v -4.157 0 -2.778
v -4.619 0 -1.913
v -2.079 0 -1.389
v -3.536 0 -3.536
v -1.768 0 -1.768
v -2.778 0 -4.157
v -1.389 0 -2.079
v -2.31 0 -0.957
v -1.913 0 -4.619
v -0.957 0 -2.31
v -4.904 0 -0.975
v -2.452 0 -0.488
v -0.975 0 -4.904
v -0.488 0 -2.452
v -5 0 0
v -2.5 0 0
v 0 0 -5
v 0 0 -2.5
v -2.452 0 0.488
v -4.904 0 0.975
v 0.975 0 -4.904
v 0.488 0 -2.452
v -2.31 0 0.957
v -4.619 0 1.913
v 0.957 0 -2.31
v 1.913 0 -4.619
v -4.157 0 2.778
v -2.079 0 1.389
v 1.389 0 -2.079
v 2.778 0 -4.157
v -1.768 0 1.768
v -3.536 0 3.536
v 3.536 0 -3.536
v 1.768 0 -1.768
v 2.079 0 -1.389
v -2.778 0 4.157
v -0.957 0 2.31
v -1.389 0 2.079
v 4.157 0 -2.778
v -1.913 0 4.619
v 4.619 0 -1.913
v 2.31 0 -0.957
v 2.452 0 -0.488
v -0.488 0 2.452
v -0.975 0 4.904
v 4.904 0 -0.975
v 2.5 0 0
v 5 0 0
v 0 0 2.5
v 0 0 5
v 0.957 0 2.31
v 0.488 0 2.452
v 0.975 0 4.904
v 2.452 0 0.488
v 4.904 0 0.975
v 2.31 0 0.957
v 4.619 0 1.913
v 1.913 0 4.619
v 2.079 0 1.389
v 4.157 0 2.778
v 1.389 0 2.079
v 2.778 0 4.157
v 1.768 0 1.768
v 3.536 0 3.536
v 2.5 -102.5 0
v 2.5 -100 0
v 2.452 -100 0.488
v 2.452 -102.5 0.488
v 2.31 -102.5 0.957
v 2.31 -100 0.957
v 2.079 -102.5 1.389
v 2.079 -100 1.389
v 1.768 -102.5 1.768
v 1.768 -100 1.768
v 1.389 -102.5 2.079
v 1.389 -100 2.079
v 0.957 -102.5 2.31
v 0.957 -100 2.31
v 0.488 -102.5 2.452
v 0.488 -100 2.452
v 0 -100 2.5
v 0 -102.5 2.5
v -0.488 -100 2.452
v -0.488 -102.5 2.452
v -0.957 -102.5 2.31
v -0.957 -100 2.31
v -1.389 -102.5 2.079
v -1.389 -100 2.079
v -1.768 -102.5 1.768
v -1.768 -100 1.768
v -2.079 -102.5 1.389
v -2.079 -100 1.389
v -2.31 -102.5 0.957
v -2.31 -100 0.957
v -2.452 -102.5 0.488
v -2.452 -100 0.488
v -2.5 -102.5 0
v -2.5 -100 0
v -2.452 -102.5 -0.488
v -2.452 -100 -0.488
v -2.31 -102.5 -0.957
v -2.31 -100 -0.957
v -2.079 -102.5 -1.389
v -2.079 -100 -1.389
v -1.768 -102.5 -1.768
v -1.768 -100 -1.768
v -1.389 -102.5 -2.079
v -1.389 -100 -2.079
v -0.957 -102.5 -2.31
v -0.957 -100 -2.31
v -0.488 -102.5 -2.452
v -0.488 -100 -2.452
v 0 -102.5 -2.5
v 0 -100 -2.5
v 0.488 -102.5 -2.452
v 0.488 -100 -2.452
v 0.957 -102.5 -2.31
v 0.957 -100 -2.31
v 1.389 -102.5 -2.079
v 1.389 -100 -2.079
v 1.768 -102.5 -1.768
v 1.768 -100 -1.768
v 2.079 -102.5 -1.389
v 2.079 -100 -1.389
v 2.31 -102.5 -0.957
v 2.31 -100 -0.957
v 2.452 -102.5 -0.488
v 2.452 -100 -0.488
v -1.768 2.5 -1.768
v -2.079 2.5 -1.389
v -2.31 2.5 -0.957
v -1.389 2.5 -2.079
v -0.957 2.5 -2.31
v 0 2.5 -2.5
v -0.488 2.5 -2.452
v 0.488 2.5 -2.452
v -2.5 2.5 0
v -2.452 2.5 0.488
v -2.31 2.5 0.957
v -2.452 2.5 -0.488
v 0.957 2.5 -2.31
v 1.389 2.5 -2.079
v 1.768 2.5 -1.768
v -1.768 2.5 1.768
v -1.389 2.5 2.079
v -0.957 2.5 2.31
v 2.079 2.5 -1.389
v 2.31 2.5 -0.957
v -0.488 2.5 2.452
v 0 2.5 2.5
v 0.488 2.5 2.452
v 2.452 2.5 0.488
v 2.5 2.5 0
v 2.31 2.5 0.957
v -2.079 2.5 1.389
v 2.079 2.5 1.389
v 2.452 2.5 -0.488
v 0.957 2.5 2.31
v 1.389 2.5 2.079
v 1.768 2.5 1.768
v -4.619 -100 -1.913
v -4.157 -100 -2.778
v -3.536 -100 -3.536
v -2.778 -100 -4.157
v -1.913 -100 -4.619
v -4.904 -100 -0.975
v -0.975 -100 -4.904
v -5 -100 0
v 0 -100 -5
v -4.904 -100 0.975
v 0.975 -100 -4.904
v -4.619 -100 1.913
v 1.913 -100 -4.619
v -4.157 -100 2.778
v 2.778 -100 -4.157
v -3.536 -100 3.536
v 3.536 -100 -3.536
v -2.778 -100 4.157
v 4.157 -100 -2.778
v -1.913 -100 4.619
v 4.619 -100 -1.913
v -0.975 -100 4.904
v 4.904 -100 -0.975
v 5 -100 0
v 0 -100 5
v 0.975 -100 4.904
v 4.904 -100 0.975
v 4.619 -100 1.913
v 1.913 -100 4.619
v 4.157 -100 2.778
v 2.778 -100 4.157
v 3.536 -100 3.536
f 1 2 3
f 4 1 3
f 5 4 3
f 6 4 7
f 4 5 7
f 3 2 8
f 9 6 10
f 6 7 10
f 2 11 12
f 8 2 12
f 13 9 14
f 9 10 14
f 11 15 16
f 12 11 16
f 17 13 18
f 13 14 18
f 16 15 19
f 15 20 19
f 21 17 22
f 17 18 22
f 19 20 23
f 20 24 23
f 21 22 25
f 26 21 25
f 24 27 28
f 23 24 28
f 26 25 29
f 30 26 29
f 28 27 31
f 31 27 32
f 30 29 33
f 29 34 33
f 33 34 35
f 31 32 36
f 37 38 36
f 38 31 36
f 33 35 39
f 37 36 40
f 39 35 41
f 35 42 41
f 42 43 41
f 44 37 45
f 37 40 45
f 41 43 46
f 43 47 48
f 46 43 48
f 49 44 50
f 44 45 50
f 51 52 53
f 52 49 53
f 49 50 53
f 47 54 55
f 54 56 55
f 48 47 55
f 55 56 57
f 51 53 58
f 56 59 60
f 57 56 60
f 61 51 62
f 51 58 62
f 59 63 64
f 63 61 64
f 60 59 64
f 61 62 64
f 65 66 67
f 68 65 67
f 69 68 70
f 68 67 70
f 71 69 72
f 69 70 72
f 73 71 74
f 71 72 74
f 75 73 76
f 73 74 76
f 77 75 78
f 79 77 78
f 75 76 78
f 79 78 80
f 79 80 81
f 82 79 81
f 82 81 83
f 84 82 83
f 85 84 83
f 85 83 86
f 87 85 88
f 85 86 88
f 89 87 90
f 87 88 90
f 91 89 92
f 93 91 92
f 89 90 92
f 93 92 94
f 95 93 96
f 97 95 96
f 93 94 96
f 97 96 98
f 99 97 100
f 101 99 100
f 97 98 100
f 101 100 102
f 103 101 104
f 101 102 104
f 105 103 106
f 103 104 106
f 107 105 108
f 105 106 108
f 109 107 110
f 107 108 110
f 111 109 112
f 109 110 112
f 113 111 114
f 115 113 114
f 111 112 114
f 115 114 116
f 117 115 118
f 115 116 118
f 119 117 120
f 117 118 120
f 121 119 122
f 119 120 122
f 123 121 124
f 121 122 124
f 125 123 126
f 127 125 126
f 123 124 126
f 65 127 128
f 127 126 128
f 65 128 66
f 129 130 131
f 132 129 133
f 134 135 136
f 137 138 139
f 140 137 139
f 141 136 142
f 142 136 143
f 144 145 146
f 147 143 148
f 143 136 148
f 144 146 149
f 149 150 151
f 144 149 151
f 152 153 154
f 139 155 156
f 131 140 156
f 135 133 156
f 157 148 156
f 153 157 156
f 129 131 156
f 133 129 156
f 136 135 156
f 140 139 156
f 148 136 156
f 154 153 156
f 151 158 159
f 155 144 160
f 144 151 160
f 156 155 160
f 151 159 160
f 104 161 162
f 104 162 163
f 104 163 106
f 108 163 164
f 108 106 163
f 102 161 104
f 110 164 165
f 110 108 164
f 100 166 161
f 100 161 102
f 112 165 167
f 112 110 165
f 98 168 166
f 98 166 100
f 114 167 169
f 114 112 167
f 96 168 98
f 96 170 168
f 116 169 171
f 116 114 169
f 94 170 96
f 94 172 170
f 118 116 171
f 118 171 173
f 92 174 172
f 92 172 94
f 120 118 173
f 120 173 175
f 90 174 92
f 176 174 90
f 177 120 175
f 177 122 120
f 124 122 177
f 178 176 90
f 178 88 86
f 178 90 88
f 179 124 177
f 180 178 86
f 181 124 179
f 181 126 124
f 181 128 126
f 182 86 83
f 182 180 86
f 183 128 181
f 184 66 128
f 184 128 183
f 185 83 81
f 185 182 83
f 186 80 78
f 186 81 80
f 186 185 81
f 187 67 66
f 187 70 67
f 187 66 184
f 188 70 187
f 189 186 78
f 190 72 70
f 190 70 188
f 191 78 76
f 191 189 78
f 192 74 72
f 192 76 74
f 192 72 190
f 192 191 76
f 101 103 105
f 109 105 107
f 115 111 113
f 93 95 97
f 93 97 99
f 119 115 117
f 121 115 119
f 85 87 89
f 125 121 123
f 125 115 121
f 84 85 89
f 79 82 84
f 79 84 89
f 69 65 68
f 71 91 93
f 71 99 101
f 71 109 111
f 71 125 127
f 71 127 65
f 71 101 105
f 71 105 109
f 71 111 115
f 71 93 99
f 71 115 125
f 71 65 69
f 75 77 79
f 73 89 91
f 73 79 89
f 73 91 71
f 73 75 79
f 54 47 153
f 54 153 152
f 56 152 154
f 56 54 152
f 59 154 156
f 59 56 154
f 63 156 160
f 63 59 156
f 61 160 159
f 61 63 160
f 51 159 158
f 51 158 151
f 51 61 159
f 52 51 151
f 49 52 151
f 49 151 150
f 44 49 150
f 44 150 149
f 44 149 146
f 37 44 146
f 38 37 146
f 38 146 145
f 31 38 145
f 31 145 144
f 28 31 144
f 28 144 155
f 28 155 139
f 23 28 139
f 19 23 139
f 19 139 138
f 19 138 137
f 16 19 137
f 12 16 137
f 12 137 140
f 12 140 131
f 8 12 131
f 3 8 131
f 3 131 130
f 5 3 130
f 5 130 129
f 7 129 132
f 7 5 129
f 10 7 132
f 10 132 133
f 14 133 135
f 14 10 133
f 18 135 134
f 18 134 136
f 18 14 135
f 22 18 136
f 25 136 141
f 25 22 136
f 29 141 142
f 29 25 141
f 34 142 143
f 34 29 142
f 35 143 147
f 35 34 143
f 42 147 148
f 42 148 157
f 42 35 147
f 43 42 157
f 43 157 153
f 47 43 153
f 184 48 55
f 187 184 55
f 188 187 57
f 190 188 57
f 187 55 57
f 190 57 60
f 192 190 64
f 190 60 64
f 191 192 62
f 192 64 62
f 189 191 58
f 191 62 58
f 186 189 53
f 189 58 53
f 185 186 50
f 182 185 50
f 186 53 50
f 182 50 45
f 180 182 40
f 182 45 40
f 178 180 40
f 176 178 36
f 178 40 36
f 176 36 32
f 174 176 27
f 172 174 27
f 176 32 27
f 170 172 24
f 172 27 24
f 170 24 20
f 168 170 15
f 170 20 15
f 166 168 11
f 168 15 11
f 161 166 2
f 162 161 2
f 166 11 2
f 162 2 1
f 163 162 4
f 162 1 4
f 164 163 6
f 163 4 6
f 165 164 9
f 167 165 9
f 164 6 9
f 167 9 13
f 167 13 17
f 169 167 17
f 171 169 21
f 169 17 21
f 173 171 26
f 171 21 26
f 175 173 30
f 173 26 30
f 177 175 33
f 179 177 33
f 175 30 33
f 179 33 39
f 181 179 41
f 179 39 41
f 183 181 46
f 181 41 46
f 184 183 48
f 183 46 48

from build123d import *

# Parameters (mm, degrees)
F0_R          = 5
F1_DEPTH      = 100
F2_R          = 2.5
F3_DEPTH      = 2.5
F3_DEPTH_BACK = 102.5


with BuildPart() as f1:
    # F0 (on Front) → F1 (new body)
    with BuildSketch(Plane.XZ):
        Circle(F0_R)
    extrude(amount=F1_DEPTH)

    # F2 (on face) → F3 (join, two sides)
    with BuildSketch(Plane.XZ.offset(100)) as f3_sk:
        Circle(F2_R)
    extrude(amount=F3_DEPTH)
    extrude(f3_sk.sketch, amount=-F3_DEPTH_BACK)


solid = f1.part
